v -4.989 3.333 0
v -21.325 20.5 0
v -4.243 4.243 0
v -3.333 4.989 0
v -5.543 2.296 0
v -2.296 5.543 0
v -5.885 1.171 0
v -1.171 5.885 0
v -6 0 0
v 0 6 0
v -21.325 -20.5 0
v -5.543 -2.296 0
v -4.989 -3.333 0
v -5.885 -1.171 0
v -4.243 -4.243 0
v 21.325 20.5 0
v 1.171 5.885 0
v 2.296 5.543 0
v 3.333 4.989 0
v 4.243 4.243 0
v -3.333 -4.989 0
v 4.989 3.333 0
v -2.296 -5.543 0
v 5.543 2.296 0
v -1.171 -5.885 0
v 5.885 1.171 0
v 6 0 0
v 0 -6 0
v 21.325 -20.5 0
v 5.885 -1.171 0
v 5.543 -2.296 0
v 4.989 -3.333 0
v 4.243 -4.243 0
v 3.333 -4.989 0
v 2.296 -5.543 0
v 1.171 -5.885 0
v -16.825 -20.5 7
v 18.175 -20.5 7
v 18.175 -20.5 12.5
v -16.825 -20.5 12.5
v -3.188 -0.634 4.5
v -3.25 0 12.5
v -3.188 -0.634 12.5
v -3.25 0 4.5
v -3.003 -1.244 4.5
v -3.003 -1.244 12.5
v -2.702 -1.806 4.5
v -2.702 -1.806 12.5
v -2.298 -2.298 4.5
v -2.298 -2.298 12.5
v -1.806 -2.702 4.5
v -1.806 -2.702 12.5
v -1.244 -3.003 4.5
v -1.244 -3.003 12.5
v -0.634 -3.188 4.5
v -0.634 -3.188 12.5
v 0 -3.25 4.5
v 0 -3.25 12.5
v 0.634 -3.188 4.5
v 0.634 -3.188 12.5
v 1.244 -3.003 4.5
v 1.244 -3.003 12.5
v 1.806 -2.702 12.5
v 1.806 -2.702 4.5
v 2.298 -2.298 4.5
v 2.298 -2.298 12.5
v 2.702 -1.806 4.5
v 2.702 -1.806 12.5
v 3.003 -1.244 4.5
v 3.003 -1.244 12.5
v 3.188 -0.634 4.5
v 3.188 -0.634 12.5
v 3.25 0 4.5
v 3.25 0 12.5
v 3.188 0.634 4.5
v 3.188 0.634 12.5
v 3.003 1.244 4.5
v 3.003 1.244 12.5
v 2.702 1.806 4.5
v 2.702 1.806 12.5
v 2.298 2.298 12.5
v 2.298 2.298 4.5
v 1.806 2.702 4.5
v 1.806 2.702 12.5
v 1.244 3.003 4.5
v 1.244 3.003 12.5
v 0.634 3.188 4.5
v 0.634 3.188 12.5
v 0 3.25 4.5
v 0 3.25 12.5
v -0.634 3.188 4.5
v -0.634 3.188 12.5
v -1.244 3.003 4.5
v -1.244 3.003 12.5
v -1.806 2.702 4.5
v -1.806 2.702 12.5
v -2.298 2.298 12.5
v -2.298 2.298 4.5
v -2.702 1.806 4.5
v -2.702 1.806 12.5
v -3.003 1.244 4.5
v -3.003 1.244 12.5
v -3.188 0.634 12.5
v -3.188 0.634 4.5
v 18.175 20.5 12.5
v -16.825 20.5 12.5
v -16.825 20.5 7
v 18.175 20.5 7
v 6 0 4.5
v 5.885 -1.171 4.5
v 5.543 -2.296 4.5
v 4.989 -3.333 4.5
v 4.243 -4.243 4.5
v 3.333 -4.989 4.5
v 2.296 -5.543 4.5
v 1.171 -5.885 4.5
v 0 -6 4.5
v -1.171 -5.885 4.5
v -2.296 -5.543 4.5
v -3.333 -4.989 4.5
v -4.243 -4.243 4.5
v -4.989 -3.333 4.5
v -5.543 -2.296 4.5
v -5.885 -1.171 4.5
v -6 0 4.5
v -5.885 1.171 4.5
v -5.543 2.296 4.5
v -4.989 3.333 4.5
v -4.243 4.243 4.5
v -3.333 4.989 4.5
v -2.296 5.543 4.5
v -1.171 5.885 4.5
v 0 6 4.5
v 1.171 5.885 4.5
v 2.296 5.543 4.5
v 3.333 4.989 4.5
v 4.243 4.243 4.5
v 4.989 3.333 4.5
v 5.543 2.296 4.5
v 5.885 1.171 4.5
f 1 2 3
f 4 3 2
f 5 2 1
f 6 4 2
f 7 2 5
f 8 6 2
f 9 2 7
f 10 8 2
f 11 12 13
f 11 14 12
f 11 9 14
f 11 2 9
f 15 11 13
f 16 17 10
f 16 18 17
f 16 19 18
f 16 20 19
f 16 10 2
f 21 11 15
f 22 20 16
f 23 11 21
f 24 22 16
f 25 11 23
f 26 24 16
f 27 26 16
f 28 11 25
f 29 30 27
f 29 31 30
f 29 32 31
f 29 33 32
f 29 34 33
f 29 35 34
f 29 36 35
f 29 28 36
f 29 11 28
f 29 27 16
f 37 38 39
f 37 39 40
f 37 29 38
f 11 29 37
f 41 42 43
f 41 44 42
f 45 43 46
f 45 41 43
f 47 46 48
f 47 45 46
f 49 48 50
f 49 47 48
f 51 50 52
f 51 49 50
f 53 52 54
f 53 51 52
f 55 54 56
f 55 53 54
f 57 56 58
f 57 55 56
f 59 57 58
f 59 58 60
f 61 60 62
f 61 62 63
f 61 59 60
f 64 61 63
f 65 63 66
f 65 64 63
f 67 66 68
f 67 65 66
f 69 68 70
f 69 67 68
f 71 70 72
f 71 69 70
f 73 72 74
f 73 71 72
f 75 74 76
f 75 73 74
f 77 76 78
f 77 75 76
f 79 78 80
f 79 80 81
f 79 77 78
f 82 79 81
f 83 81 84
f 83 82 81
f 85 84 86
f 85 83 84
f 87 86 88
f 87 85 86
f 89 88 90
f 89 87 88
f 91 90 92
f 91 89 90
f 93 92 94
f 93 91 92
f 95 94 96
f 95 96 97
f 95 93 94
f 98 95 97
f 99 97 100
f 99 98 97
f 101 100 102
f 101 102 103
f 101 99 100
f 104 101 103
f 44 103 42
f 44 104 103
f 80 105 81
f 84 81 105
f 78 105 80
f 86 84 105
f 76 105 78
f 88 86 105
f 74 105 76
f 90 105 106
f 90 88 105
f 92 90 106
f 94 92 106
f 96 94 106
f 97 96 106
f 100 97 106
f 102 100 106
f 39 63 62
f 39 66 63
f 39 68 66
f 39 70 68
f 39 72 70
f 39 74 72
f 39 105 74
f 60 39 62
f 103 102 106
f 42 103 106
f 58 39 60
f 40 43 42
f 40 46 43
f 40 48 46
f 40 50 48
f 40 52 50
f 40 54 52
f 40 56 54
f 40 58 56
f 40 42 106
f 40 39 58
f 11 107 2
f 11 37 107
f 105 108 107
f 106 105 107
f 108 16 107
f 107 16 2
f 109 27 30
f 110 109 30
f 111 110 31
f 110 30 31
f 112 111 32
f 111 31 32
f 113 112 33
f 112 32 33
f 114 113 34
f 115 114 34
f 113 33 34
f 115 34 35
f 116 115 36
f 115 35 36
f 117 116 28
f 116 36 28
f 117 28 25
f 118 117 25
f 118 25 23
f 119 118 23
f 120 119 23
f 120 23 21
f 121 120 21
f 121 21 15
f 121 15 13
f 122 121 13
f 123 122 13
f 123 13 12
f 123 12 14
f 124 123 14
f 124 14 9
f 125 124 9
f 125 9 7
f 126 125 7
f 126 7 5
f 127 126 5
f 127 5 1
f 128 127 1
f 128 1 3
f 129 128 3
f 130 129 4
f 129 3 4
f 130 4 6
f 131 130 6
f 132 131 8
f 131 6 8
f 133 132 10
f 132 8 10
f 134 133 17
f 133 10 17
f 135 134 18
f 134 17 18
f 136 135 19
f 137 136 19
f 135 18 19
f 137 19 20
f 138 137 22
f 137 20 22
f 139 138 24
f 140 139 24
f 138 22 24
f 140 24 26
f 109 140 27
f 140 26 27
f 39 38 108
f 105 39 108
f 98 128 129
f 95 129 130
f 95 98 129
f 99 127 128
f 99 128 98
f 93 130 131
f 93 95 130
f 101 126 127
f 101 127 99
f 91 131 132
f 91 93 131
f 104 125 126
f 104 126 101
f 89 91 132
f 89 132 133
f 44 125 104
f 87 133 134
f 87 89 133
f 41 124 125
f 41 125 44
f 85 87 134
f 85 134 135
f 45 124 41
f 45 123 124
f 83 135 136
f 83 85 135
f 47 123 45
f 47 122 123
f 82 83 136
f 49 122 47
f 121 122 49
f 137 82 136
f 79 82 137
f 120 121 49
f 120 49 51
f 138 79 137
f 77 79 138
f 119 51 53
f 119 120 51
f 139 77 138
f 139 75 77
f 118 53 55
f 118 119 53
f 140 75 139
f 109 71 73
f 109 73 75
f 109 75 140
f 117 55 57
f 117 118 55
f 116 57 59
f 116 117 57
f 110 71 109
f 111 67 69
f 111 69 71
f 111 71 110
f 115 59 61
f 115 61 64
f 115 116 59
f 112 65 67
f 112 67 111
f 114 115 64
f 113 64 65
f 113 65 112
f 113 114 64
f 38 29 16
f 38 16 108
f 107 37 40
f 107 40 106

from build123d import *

# Parameters (mm, degrees)
F1_DEPTH       = 20.5
F3_D           = 6.5
F3_CBORE_D     = 12
F3_CBORE_DEPTH = 4.5
F4_DEPTH       = 5.5


with BuildPart() as f1:
    # F0 (on Front) → F1 (new body, symmetric)
    with BuildSketch(Plane.XZ):
        Polygon((-16.825, 7), (-21.325, 0), (21.325, 0), (18.175, 7), align=None)
    extrude(amount=F1_DEPTH, both=True)

    # F3 (through all)
    with Locations(Plane(origin=(0, 0, 0), x_dir=(1, 0, 0), z_dir=(0, 0, -1))):
        with Locations((0, 0)):
            CounterBoreHole(F3_D / 2, F3_CBORE_D / 2, F3_CBORE_DEPTH)

    # F4 (add): a face of the model
    f4_faces = [f1.faces().sort_by_distance(p)[0] for p in [
        (0.675, 19.9609267211, 7),
    ]]
    extrude(f4_faces, amount=F4_DEPTH)


solid = f1.part
